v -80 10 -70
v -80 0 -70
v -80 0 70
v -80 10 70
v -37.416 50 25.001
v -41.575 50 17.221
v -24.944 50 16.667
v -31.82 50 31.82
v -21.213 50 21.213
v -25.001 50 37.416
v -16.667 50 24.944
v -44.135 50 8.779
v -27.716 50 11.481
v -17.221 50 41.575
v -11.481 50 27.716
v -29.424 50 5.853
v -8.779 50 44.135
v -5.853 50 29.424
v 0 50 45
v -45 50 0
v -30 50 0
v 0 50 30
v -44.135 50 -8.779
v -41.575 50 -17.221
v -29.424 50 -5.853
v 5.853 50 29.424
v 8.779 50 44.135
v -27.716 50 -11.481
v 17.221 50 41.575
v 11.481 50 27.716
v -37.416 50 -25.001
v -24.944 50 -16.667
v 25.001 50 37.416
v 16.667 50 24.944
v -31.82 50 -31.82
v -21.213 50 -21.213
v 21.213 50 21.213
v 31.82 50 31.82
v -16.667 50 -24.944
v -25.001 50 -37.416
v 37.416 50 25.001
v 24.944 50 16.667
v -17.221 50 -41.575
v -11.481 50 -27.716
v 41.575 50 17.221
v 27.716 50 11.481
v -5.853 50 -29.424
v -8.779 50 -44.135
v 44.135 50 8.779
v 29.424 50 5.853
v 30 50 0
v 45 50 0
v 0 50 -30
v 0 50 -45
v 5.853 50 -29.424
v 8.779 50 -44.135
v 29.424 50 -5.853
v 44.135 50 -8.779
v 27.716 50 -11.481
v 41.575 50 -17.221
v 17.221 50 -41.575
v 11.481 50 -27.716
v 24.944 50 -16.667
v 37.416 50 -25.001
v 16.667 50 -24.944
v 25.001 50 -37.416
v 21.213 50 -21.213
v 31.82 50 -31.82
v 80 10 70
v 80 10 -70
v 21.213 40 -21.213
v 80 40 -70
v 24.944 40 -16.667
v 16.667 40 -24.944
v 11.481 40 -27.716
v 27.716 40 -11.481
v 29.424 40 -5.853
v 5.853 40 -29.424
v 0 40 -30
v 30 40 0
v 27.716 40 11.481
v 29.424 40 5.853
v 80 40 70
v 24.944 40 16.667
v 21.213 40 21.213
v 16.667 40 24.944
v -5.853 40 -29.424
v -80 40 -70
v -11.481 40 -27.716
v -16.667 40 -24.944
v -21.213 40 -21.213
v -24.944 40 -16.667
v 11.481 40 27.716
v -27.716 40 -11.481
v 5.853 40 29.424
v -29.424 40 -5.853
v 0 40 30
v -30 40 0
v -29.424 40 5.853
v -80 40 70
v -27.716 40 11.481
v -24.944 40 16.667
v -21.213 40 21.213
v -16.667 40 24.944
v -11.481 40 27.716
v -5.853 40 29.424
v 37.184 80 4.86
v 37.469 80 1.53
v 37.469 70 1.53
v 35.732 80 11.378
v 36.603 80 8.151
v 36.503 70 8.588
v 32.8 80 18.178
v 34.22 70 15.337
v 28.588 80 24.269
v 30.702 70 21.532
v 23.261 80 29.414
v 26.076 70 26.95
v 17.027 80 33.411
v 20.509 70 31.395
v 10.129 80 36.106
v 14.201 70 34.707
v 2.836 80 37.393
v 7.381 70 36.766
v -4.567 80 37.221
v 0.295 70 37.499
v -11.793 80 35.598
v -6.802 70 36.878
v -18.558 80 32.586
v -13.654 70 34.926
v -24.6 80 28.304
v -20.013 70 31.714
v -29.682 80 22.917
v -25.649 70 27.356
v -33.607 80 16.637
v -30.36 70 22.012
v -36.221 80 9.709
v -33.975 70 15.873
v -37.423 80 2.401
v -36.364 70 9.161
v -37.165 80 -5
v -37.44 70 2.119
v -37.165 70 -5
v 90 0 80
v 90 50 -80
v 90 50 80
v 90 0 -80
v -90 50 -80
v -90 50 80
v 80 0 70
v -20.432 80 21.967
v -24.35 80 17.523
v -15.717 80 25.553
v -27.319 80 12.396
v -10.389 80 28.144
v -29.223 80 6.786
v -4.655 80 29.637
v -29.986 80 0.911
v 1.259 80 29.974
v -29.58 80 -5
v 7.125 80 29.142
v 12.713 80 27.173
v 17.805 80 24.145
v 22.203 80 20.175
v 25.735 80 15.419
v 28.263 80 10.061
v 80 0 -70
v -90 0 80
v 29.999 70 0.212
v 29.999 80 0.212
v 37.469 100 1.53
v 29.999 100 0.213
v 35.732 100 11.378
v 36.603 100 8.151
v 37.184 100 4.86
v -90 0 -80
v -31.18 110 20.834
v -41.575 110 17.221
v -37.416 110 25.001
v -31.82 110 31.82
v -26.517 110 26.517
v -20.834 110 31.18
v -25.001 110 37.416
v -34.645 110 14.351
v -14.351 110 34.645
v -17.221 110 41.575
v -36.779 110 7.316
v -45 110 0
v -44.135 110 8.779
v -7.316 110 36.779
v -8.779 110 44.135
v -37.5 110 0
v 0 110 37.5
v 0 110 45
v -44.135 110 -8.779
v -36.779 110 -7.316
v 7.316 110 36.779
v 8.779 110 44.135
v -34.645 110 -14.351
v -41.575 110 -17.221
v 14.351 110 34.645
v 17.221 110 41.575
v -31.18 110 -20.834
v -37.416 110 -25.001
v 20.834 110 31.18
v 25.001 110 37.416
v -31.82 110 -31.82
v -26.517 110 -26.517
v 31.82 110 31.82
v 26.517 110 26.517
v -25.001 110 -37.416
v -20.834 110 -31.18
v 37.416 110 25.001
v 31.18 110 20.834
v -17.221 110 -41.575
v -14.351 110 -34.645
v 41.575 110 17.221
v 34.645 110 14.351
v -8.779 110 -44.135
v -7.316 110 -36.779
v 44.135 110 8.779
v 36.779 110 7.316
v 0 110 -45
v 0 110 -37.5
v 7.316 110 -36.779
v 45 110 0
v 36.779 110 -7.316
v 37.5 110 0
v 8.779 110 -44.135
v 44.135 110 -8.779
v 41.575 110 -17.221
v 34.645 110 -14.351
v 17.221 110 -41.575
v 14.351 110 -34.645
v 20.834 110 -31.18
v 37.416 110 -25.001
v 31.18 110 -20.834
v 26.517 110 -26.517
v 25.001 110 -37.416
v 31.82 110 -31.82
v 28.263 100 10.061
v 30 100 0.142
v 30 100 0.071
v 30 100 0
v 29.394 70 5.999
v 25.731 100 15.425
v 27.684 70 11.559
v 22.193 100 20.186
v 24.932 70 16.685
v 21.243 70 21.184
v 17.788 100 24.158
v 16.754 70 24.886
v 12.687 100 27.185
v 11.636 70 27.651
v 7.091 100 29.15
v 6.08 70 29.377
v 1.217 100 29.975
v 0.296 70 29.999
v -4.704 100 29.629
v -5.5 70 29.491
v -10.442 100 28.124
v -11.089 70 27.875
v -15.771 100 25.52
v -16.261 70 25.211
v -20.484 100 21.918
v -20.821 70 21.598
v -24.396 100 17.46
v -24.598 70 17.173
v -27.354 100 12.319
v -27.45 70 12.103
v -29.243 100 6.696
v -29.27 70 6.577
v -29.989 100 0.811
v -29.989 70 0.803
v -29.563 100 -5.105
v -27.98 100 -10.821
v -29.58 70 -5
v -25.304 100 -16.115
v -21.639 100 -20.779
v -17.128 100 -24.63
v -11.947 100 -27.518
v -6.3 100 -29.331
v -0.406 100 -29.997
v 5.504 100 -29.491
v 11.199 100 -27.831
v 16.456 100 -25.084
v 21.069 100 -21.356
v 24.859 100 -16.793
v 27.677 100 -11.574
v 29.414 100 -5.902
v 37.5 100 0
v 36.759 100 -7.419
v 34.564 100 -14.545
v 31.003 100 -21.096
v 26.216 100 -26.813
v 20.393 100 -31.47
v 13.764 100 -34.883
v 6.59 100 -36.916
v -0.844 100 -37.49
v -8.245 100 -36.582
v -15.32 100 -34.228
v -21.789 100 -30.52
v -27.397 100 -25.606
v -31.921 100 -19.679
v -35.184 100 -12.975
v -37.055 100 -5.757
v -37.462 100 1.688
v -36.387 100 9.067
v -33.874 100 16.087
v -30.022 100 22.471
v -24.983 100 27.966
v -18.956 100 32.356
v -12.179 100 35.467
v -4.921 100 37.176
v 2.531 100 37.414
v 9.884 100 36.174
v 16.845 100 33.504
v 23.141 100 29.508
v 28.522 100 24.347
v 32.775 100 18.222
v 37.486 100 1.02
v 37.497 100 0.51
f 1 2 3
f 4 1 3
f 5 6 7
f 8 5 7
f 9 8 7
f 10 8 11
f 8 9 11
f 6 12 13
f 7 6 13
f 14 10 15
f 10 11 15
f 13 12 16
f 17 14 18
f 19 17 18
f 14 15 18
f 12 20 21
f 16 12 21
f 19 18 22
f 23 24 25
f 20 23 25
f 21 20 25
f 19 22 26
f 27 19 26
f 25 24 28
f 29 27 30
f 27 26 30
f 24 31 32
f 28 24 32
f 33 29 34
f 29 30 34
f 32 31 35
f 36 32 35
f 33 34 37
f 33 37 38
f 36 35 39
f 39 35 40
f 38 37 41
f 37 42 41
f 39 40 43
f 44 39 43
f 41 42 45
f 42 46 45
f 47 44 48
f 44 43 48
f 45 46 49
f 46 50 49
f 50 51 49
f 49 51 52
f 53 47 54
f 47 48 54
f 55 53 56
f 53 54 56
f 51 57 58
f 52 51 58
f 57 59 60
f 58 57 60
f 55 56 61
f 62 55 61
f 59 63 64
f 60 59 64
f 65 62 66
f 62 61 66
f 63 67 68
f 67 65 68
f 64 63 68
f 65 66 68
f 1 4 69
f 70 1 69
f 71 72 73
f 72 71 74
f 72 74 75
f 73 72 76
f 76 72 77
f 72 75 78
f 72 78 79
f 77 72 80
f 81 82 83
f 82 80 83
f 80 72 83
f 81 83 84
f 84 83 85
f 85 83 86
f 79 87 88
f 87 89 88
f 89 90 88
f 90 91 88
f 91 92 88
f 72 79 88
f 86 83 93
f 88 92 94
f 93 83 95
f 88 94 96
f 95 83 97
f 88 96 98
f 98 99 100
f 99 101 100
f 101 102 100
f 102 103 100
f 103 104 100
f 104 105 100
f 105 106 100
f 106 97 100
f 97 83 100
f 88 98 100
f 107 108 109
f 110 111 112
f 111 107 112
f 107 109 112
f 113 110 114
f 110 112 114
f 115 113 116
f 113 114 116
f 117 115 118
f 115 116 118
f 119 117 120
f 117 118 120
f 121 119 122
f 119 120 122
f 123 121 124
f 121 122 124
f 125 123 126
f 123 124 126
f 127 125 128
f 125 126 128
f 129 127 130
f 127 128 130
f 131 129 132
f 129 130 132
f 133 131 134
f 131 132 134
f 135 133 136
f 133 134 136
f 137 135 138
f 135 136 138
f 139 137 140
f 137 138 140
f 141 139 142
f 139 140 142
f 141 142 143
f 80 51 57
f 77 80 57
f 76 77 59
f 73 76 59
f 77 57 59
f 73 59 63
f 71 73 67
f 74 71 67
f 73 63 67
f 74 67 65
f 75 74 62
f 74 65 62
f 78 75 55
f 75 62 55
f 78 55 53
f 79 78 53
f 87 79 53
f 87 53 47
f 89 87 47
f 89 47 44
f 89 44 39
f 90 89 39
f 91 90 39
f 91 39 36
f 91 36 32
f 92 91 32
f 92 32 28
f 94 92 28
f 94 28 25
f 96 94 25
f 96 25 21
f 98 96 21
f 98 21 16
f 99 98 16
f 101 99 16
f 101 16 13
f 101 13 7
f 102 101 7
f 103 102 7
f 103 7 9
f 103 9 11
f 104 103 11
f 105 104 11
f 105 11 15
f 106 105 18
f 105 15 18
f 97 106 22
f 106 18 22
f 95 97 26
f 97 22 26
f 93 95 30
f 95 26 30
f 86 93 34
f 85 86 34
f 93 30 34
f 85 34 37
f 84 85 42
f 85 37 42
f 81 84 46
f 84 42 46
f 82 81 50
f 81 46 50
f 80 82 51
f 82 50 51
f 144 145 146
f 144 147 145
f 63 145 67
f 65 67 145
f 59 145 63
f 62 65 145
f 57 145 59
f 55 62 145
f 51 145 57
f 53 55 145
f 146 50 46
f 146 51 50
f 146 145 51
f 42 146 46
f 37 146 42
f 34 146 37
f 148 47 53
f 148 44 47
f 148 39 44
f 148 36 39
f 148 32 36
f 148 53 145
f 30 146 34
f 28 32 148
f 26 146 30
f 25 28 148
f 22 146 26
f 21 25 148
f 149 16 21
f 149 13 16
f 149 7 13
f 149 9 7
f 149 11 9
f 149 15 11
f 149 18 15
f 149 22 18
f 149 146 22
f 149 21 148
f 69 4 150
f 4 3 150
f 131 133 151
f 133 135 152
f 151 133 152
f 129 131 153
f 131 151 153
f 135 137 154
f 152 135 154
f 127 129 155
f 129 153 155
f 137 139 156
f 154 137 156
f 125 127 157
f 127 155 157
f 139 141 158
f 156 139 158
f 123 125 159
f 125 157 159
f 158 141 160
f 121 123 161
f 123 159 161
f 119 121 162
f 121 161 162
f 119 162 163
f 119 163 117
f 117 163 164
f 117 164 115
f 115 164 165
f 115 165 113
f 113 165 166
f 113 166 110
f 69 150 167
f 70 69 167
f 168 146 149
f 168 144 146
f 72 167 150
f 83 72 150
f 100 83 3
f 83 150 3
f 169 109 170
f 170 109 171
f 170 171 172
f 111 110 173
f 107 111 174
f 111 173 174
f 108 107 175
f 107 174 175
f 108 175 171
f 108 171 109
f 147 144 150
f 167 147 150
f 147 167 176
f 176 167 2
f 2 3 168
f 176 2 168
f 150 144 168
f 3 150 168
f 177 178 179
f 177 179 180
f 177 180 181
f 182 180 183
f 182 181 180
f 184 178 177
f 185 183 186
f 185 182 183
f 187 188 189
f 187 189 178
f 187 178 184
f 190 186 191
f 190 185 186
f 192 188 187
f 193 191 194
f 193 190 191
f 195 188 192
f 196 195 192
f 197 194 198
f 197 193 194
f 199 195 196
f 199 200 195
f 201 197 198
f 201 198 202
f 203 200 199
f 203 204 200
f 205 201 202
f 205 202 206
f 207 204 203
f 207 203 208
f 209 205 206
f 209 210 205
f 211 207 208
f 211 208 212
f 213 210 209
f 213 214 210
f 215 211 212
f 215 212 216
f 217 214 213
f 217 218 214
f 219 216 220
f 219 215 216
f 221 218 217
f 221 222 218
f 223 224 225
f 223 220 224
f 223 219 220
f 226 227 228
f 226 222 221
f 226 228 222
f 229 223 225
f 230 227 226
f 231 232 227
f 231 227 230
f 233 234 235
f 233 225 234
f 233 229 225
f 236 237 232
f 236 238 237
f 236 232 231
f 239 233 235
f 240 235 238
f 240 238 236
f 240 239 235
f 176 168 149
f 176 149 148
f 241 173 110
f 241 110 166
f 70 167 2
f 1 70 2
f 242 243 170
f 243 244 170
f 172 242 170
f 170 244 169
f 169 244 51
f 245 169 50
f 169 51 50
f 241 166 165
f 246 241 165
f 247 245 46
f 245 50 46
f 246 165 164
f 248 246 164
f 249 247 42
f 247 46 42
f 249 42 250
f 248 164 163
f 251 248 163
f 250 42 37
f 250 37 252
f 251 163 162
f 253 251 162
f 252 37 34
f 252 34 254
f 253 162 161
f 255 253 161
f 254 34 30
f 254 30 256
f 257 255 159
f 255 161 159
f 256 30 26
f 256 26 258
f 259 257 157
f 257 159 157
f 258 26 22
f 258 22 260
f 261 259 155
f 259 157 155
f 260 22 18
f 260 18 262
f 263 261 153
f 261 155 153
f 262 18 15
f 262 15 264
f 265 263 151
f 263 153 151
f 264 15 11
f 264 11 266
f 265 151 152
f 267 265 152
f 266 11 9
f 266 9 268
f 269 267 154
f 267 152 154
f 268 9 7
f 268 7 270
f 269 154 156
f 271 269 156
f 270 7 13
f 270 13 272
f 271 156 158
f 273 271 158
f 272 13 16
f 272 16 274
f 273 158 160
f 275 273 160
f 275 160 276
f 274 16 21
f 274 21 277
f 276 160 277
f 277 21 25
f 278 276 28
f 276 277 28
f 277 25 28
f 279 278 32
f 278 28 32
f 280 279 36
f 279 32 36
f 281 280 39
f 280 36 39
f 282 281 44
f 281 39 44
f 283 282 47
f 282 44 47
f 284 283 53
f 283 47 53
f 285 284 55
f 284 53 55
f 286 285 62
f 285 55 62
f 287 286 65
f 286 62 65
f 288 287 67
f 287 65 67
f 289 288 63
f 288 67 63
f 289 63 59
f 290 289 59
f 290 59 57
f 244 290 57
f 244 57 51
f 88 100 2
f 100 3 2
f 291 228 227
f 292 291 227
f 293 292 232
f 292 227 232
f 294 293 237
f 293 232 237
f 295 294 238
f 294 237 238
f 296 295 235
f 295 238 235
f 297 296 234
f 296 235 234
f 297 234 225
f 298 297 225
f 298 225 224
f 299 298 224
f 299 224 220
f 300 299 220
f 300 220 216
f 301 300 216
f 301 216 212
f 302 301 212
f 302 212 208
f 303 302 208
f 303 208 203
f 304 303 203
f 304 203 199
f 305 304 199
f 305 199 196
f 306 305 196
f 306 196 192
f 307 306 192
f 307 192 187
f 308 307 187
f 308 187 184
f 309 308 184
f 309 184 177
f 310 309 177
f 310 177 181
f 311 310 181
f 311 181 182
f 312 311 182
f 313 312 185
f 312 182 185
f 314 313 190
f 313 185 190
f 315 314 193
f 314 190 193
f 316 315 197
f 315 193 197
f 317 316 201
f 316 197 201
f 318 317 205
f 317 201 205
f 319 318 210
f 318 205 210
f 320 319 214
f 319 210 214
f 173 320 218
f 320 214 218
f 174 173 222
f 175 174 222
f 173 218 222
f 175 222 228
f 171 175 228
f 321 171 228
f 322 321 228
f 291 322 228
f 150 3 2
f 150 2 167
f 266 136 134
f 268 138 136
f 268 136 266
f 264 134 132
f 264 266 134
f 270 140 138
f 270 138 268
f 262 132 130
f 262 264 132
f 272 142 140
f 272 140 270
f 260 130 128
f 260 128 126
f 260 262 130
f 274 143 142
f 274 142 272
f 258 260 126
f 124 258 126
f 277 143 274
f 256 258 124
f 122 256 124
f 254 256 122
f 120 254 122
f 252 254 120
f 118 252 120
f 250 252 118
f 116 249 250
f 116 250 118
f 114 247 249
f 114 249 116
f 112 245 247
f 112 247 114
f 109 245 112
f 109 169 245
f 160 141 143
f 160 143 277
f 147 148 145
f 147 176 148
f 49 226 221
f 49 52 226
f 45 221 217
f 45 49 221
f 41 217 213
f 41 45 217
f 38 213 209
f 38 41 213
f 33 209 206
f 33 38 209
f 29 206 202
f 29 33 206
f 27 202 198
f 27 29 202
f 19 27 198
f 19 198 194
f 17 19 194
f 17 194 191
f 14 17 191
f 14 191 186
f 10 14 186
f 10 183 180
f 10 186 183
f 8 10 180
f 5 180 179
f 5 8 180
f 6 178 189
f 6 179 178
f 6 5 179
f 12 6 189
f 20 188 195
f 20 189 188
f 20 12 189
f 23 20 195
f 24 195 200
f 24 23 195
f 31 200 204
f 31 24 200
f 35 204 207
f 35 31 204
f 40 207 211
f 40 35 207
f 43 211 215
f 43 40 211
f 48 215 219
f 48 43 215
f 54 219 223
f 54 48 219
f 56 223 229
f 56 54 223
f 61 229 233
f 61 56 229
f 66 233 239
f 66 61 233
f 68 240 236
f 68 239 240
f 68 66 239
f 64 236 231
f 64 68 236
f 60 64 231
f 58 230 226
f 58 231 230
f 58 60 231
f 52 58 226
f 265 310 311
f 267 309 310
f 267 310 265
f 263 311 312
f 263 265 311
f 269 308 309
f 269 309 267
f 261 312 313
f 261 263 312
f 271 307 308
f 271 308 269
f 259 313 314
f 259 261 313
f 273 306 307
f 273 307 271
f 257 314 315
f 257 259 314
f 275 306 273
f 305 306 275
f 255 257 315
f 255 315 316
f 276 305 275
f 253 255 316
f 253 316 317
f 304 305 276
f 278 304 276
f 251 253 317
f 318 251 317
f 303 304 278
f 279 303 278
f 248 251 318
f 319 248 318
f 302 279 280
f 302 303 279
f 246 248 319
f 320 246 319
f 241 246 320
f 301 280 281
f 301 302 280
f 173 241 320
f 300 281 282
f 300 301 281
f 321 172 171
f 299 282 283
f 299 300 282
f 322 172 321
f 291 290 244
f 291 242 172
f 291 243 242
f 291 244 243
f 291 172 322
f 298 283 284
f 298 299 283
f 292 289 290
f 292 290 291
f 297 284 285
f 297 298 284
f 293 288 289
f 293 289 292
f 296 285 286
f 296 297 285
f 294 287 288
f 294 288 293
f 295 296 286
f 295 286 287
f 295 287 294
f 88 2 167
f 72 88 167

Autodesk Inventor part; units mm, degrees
ref_plane "YZ Plane" through (0, 0, 0) normal (1, 0, 0) x (0, 1, 0)
ref_plane "XZ Plane" through (0, 0, 0) normal (0, 1, 0) x (-1, 0, 0)
ref_plane "XY Plane" through (0, 0, 0) normal (0, 0, 1) x (1, 0, 0)
sketch "Sketch2" plane through (0, 0, 0) normal (0, 1, 0) x (-1, 0, 0)
  line L0 (90, -80) -> (-90, -80)
  line L1 (-90, -80) -> (-90, 80)
  line L2 (-90, 80) -> (90, 80)
  line L3 (90, 80) -> (90, -80)
  line L4 (90, -80) -> (-90, 80) construction
  line L5 (-90, -80) -> (90, 80) construction
  point P0 (0, 0)
  dimension "d0" = 180
  dimension "d1" = 160
extrude "Extrusion1" add sketch "Sketch2" along normal blind 50
shell "Shell1" thickness 10 removed faces 1 at (30, 0, -26.6667)
sketch "Sketch4" plane through (0, 0, 0) normal (0, -1, 0) x (1, 0, 0)
  line L0 (-80, 70) -> (80, 70) projected
  line L1 (-80, -70) -> (-80, 70) projected
  line L2 (80, -70) -> (-80, -70) projected
  line L3 (80, 70) -> (80, -70) projected
  point P0 (0, 0)
extrude "Extrusion3" add sketch "Sketch4" against normal blind 10 separate body
sketch "Sketch5" plane through (0, 50, 0) normal (0, 1, 0) x (1, 0, 0)
  circle A0 centre (0, 0) radius 30
  circle A1 centre (0, 0) radius 45
  dimension "d9" = 60
  dimension "d10" = 90
extrude "Extrusion4" add sketch "Sketch5" along normal blind 60 separate body
extrude "Extrusion5" cut sketch "Sketch5" against normal blind 120 contours A0 bodies 1
ref_plane "Work Plane1" through (0, 100, 0) normal (0, 1, 0) x (1, 0, 0)
sketch "Sketch6" plane through (0, 110, 0) normal (0, 1, 0) x (1, 0, 0)
  circle A0 centre (0, 0) radius 30 projected
  circle A1 centre (0, 0) radius 37.5
  dimension "d16" = 75
extrude "Extrusion6" cut sketch "Sketch6" against normal blind 10 bodies 3
ref_plane "Work Plane2" through (0, 70, 0) normal (0, 1, 0) x (1, 0, 0)
sketch "Sketch8" plane through (0, 70, 0) normal (0, 1, 0) x (1, 0, 0)
  circle A0 centre (0, 0) radius 37.5 projected
  circle A1 centre (0, 0) radius 30 projected
  line L0 (0, 0) -> (29.5442, -5.2094)
  circle A2 centre (0, 0) radius 30 projected
  line L1 (0, 0) -> (30, 0) construction
  line L2 (29.5442, -5.2094) -> (36.9303, -6.5118)
  line L3 (0, 0) -> (-30, 0)
  circle A3 centre (0, 0) radius 30 projected
  line L4 (-30, 0) -> (-30, 5)
  line L5 (-30, 5) -> (-37.5, 5)
  line L6 (-37.5, 5) -> (-37.5, 0)
  line L7 (-37.5, 0) -> (-30, 0)
  line L8 (29.5442, -5.2094) -> (36.9303, -6.5118)
  line L9 (36.9303, -6.5118) -> (37.7985, -1.5878)
  line L10 (37.7985, -1.5878) -> (30.4125, -0.2854)
  line L11 (30.4125, -0.2854) -> (29.5442, -5.2094)
  arc A4 (-30, 0) -> (29.5442, -5.2094) centre (0, 0) ccw
  arc A5 (-37.5, 0) -> (36.9303, -6.5118) centre (0, 0) ccw
  line L12 (-30, 5) -> (-29.5804, 5)
  line L13 (30.4125, -0.2854) -> (29.9992, -0.2125)
  point P0 (37.4688, -1.5296)
  point P1 (-37.1652, 5)
  dimension "d20" = 10
  dimension "d21" = 5
  dimension "d22" = 5
extrude "Extrusion7" cut sketch "Sketch8" along normal blind 10 contours L7 A1 L2 A0 | A0 L5 L4 L7 | L2 L11 L10 A0 | L4 L12 A1 | A1 L13 L11 bodies 3
sketch "Sketch9" plane through (0, 100, 0) normal (0, 1, 0) x (1, 0, 0)
  line L0 (37.4688, -1.5296) -> (29.9992, -0.2125) projected
  arc A0 (-29.5804, 5) -> (29.9992, -0.2125) centre (0, 0) ccw projected
  line L1 (-29.5804, 5) -> (-37.1652, 5) projected
  arc A1 (-37.1652, 5) -> (37.4688, -1.5296) centre (0, 0) ccw projected
  line L2 (29.9992, -0.2125) -> (37.4688, -1.5296)
  line L3 (37.4688, -1.5296) -> (35.7323, -11.3777)
  line L4 (35.7323, -11.3777) -> (28.2628, -10.0606)
  line L5 (28.2628, -10.0606) -> (29.9992, -0.2125)
  line L6 (35.7323, -11.3777) -> (35.7323, -11.3777)
  circle A2 centre (0, 0) radius 37.5 projected
  point P0 (36.9303, -6.5118)
  point P1 (28.2628, -10.0606)
  dimension "d25" = 10
extrude "Extrusion9" cut sketch "Sketch9" against normal up to surface (30 mm away) contours L3 L4 A0 L0 | A1 L3 bodies 3
properties part number "BrakeCover"
